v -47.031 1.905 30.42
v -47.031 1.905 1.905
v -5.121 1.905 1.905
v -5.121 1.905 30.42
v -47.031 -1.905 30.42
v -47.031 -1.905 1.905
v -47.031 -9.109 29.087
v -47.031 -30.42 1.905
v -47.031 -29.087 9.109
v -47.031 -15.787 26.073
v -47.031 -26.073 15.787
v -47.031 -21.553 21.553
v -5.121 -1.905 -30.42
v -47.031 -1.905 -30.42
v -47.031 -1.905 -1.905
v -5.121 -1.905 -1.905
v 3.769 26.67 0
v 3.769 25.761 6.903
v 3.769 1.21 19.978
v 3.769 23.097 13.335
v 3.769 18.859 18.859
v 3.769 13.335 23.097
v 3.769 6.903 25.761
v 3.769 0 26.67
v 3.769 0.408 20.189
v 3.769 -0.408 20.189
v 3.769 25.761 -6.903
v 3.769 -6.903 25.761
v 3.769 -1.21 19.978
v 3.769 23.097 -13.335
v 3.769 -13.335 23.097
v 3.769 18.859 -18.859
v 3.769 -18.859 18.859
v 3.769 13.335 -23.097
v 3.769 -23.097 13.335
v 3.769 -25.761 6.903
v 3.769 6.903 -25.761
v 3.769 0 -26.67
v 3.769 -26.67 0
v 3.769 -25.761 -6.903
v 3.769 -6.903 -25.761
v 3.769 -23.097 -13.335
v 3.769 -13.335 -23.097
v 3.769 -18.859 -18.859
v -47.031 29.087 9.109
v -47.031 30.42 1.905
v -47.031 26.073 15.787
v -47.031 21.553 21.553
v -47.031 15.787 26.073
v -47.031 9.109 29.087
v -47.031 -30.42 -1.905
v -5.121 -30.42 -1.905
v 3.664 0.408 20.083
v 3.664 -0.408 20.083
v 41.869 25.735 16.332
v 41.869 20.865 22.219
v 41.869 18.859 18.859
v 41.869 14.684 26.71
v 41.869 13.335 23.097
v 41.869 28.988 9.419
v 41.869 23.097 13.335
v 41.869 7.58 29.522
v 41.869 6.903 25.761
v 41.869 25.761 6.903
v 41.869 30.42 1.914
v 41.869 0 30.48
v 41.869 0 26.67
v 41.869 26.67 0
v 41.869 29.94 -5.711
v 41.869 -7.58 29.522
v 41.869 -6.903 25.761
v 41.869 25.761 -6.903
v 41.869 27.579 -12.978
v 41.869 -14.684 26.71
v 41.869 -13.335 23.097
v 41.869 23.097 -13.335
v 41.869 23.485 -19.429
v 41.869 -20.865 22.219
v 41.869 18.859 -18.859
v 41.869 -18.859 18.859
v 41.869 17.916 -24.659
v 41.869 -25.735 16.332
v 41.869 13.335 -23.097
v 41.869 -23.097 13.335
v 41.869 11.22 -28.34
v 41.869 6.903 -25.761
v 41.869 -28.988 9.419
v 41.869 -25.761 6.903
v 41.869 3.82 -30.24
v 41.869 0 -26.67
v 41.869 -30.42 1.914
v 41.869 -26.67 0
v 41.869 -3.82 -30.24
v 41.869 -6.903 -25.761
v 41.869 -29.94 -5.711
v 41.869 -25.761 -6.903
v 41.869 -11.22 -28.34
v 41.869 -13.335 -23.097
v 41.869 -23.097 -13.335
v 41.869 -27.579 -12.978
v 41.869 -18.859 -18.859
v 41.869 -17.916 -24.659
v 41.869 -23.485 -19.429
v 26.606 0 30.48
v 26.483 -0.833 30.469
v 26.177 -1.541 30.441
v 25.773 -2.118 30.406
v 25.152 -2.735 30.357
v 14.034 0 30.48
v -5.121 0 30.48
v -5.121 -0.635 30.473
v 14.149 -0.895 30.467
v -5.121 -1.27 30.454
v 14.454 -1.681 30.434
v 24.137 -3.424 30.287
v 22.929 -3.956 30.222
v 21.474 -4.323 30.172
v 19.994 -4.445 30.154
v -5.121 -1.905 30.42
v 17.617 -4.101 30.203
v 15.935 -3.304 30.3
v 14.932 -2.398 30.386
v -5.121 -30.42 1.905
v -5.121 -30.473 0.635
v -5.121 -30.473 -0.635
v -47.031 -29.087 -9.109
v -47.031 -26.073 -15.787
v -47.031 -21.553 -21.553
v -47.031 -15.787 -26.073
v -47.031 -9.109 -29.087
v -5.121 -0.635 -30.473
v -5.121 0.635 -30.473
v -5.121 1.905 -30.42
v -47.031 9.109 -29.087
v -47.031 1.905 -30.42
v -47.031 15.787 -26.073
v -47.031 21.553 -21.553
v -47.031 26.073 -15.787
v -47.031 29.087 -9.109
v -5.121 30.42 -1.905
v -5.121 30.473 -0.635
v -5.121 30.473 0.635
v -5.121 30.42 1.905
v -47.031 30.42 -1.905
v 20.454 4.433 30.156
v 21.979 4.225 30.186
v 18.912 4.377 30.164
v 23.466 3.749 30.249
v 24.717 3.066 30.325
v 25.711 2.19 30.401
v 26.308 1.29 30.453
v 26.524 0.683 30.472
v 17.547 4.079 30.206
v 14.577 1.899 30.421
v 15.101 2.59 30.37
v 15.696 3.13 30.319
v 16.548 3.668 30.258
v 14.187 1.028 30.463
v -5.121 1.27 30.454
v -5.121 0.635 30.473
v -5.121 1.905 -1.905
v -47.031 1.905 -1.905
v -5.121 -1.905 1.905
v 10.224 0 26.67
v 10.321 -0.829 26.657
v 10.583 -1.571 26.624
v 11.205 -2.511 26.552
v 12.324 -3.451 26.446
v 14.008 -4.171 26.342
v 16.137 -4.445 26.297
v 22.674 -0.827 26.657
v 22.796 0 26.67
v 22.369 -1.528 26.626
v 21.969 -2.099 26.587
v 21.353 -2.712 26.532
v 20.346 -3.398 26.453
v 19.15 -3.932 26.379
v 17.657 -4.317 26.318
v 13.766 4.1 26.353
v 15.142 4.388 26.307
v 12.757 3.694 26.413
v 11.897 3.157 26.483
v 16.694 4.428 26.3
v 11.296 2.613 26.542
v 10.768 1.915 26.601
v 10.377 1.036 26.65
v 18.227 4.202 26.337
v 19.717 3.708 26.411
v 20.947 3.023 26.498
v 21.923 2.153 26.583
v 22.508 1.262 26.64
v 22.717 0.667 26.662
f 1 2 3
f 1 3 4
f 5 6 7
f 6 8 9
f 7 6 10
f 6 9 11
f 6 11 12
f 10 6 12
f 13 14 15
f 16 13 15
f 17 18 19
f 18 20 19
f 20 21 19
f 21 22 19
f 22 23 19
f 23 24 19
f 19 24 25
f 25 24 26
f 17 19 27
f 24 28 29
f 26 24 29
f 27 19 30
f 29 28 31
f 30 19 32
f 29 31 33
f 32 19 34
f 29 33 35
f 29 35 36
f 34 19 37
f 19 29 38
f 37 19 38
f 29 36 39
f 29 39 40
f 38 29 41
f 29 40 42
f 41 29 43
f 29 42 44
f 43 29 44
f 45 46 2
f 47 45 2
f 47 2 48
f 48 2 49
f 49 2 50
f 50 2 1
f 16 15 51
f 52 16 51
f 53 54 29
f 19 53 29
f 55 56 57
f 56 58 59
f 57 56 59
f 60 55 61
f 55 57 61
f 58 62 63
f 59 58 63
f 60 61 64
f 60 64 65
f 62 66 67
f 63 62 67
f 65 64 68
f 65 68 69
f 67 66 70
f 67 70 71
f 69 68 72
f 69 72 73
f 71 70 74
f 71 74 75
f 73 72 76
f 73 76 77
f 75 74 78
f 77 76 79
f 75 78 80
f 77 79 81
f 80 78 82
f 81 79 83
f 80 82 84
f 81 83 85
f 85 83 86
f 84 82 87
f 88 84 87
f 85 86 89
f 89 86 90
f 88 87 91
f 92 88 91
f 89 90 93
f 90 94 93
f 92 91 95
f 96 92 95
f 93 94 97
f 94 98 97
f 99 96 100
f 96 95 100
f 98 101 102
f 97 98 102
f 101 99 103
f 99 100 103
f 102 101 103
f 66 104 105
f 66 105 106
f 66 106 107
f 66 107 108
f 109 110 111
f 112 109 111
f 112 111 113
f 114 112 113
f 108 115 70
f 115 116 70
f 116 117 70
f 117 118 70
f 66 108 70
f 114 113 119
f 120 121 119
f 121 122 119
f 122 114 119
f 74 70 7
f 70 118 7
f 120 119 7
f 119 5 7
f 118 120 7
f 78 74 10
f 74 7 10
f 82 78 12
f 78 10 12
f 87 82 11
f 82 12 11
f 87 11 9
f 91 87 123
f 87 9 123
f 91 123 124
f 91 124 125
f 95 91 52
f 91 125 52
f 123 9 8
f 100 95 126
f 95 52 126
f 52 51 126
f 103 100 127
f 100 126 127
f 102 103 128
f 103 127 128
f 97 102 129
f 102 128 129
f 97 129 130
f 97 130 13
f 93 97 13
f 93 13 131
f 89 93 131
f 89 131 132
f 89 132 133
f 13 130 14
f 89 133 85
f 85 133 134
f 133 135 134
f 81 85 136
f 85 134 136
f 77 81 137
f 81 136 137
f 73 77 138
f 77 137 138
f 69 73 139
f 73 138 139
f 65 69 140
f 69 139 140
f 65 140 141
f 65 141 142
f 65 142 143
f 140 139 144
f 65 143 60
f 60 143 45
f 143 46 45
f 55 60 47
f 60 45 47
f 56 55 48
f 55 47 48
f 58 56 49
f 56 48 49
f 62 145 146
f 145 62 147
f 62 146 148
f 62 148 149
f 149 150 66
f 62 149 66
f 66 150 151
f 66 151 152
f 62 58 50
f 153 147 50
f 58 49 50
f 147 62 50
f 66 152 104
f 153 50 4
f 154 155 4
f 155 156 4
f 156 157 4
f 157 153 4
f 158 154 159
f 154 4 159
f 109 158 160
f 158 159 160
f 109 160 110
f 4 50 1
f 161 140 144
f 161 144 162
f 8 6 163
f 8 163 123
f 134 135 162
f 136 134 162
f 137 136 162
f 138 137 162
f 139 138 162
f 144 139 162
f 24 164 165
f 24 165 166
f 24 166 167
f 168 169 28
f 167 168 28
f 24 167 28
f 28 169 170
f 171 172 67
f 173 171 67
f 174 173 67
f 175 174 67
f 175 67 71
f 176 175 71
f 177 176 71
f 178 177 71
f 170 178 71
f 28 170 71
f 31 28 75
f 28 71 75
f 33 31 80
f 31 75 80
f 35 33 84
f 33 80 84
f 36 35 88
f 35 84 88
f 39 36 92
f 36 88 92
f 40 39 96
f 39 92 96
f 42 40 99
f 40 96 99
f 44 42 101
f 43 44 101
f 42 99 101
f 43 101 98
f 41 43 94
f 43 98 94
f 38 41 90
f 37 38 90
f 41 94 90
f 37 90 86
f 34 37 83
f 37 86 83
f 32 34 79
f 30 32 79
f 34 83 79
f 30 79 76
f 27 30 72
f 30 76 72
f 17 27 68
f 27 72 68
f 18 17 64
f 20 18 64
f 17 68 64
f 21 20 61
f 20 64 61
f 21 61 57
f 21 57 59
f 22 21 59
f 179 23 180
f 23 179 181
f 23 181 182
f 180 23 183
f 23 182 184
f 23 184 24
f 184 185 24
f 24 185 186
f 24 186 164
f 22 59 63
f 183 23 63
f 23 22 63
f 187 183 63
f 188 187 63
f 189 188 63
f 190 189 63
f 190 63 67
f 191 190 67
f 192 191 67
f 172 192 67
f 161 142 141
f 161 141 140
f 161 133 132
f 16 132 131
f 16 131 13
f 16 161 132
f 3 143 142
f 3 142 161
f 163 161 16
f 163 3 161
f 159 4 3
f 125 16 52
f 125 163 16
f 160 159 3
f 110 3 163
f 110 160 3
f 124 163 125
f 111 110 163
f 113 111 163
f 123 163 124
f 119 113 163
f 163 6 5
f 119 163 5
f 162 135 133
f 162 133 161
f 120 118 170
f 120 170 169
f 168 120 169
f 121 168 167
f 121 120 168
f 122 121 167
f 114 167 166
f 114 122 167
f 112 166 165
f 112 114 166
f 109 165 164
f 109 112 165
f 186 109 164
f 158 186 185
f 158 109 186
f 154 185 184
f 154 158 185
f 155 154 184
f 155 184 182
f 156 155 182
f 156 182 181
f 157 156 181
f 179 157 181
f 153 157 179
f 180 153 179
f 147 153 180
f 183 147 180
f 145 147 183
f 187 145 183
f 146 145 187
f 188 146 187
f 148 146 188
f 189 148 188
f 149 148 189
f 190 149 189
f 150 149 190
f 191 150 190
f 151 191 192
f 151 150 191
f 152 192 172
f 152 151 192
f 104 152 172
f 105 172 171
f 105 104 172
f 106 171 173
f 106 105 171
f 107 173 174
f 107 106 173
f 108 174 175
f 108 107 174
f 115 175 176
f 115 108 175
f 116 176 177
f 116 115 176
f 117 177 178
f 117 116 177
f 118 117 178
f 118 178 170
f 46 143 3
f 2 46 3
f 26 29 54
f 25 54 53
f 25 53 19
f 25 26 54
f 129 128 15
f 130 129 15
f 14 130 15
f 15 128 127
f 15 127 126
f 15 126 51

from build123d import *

# Parameters (mm, degrees)
F2_W     = 36.676987372
F2_H     = 3.81
F2_W_2   = 3.81
F2_H_2   = 32.5926636749
F2_W_3   = 35.713012628
F2_H_3   = 39.7973363251
F3_DEPTH = 41.91
F6_R     = 4.445
F7_DEPTH = 76.708


with BuildPart() as f1:
    # F0 (on Front) → F1 (revolve)
    with BuildSketch(Plane.XZ):
        Polygon((-47.0309668349, 30.48), (-47.0309668349, 0), (3.7690331651, 0), (3.7690331651, 26.67), (41.8690331651, 26.67), (41.8690331651, 30.48), align=None)
    revolve(axis=Axis((6.2270945557, 0, 0), (1, 0, 0)))

    # F2 (on face) → F3 (cut)
    with BuildSketch(Plane(origin=(-47.0309668349, 0, 0), x_dir=(0, -1, 0), z_dir=(-1, 0, 0))):
        with Locations((-20.243493686, 0)):
            Rectangle(F2_W, F2_H)
        with Locations((0, 18.2013318375)):
            Rectangle(F2_W_2, F2_H_2)
        Rectangle(F2_W_2, F2_H)
        with Locations((19.761506314, 0)):
            Rectangle(F2_W_3, F2_H)
        with Locations((0, -21.8036681625)):
            Rectangle(F2_W_2, F2_H_3)
    extrude(amount=-F3_DEPTH, mode=Mode.SUBTRACT)

    # F6 (on line) → F7 (cut)
    with BuildSketch(Plane(origin=(66.1142536219, 0, 66.1142536219), x_dir=(0, -1, 0), z_dir=(-0.7071067812, 0, -0.7071067812))):
        with Locations((0, 7.1842048969)):
            Circle(F6_R)
    extrude(amount=F7_DEPTH, mode=Mode.SUBTRACT)


solid = f1.part
